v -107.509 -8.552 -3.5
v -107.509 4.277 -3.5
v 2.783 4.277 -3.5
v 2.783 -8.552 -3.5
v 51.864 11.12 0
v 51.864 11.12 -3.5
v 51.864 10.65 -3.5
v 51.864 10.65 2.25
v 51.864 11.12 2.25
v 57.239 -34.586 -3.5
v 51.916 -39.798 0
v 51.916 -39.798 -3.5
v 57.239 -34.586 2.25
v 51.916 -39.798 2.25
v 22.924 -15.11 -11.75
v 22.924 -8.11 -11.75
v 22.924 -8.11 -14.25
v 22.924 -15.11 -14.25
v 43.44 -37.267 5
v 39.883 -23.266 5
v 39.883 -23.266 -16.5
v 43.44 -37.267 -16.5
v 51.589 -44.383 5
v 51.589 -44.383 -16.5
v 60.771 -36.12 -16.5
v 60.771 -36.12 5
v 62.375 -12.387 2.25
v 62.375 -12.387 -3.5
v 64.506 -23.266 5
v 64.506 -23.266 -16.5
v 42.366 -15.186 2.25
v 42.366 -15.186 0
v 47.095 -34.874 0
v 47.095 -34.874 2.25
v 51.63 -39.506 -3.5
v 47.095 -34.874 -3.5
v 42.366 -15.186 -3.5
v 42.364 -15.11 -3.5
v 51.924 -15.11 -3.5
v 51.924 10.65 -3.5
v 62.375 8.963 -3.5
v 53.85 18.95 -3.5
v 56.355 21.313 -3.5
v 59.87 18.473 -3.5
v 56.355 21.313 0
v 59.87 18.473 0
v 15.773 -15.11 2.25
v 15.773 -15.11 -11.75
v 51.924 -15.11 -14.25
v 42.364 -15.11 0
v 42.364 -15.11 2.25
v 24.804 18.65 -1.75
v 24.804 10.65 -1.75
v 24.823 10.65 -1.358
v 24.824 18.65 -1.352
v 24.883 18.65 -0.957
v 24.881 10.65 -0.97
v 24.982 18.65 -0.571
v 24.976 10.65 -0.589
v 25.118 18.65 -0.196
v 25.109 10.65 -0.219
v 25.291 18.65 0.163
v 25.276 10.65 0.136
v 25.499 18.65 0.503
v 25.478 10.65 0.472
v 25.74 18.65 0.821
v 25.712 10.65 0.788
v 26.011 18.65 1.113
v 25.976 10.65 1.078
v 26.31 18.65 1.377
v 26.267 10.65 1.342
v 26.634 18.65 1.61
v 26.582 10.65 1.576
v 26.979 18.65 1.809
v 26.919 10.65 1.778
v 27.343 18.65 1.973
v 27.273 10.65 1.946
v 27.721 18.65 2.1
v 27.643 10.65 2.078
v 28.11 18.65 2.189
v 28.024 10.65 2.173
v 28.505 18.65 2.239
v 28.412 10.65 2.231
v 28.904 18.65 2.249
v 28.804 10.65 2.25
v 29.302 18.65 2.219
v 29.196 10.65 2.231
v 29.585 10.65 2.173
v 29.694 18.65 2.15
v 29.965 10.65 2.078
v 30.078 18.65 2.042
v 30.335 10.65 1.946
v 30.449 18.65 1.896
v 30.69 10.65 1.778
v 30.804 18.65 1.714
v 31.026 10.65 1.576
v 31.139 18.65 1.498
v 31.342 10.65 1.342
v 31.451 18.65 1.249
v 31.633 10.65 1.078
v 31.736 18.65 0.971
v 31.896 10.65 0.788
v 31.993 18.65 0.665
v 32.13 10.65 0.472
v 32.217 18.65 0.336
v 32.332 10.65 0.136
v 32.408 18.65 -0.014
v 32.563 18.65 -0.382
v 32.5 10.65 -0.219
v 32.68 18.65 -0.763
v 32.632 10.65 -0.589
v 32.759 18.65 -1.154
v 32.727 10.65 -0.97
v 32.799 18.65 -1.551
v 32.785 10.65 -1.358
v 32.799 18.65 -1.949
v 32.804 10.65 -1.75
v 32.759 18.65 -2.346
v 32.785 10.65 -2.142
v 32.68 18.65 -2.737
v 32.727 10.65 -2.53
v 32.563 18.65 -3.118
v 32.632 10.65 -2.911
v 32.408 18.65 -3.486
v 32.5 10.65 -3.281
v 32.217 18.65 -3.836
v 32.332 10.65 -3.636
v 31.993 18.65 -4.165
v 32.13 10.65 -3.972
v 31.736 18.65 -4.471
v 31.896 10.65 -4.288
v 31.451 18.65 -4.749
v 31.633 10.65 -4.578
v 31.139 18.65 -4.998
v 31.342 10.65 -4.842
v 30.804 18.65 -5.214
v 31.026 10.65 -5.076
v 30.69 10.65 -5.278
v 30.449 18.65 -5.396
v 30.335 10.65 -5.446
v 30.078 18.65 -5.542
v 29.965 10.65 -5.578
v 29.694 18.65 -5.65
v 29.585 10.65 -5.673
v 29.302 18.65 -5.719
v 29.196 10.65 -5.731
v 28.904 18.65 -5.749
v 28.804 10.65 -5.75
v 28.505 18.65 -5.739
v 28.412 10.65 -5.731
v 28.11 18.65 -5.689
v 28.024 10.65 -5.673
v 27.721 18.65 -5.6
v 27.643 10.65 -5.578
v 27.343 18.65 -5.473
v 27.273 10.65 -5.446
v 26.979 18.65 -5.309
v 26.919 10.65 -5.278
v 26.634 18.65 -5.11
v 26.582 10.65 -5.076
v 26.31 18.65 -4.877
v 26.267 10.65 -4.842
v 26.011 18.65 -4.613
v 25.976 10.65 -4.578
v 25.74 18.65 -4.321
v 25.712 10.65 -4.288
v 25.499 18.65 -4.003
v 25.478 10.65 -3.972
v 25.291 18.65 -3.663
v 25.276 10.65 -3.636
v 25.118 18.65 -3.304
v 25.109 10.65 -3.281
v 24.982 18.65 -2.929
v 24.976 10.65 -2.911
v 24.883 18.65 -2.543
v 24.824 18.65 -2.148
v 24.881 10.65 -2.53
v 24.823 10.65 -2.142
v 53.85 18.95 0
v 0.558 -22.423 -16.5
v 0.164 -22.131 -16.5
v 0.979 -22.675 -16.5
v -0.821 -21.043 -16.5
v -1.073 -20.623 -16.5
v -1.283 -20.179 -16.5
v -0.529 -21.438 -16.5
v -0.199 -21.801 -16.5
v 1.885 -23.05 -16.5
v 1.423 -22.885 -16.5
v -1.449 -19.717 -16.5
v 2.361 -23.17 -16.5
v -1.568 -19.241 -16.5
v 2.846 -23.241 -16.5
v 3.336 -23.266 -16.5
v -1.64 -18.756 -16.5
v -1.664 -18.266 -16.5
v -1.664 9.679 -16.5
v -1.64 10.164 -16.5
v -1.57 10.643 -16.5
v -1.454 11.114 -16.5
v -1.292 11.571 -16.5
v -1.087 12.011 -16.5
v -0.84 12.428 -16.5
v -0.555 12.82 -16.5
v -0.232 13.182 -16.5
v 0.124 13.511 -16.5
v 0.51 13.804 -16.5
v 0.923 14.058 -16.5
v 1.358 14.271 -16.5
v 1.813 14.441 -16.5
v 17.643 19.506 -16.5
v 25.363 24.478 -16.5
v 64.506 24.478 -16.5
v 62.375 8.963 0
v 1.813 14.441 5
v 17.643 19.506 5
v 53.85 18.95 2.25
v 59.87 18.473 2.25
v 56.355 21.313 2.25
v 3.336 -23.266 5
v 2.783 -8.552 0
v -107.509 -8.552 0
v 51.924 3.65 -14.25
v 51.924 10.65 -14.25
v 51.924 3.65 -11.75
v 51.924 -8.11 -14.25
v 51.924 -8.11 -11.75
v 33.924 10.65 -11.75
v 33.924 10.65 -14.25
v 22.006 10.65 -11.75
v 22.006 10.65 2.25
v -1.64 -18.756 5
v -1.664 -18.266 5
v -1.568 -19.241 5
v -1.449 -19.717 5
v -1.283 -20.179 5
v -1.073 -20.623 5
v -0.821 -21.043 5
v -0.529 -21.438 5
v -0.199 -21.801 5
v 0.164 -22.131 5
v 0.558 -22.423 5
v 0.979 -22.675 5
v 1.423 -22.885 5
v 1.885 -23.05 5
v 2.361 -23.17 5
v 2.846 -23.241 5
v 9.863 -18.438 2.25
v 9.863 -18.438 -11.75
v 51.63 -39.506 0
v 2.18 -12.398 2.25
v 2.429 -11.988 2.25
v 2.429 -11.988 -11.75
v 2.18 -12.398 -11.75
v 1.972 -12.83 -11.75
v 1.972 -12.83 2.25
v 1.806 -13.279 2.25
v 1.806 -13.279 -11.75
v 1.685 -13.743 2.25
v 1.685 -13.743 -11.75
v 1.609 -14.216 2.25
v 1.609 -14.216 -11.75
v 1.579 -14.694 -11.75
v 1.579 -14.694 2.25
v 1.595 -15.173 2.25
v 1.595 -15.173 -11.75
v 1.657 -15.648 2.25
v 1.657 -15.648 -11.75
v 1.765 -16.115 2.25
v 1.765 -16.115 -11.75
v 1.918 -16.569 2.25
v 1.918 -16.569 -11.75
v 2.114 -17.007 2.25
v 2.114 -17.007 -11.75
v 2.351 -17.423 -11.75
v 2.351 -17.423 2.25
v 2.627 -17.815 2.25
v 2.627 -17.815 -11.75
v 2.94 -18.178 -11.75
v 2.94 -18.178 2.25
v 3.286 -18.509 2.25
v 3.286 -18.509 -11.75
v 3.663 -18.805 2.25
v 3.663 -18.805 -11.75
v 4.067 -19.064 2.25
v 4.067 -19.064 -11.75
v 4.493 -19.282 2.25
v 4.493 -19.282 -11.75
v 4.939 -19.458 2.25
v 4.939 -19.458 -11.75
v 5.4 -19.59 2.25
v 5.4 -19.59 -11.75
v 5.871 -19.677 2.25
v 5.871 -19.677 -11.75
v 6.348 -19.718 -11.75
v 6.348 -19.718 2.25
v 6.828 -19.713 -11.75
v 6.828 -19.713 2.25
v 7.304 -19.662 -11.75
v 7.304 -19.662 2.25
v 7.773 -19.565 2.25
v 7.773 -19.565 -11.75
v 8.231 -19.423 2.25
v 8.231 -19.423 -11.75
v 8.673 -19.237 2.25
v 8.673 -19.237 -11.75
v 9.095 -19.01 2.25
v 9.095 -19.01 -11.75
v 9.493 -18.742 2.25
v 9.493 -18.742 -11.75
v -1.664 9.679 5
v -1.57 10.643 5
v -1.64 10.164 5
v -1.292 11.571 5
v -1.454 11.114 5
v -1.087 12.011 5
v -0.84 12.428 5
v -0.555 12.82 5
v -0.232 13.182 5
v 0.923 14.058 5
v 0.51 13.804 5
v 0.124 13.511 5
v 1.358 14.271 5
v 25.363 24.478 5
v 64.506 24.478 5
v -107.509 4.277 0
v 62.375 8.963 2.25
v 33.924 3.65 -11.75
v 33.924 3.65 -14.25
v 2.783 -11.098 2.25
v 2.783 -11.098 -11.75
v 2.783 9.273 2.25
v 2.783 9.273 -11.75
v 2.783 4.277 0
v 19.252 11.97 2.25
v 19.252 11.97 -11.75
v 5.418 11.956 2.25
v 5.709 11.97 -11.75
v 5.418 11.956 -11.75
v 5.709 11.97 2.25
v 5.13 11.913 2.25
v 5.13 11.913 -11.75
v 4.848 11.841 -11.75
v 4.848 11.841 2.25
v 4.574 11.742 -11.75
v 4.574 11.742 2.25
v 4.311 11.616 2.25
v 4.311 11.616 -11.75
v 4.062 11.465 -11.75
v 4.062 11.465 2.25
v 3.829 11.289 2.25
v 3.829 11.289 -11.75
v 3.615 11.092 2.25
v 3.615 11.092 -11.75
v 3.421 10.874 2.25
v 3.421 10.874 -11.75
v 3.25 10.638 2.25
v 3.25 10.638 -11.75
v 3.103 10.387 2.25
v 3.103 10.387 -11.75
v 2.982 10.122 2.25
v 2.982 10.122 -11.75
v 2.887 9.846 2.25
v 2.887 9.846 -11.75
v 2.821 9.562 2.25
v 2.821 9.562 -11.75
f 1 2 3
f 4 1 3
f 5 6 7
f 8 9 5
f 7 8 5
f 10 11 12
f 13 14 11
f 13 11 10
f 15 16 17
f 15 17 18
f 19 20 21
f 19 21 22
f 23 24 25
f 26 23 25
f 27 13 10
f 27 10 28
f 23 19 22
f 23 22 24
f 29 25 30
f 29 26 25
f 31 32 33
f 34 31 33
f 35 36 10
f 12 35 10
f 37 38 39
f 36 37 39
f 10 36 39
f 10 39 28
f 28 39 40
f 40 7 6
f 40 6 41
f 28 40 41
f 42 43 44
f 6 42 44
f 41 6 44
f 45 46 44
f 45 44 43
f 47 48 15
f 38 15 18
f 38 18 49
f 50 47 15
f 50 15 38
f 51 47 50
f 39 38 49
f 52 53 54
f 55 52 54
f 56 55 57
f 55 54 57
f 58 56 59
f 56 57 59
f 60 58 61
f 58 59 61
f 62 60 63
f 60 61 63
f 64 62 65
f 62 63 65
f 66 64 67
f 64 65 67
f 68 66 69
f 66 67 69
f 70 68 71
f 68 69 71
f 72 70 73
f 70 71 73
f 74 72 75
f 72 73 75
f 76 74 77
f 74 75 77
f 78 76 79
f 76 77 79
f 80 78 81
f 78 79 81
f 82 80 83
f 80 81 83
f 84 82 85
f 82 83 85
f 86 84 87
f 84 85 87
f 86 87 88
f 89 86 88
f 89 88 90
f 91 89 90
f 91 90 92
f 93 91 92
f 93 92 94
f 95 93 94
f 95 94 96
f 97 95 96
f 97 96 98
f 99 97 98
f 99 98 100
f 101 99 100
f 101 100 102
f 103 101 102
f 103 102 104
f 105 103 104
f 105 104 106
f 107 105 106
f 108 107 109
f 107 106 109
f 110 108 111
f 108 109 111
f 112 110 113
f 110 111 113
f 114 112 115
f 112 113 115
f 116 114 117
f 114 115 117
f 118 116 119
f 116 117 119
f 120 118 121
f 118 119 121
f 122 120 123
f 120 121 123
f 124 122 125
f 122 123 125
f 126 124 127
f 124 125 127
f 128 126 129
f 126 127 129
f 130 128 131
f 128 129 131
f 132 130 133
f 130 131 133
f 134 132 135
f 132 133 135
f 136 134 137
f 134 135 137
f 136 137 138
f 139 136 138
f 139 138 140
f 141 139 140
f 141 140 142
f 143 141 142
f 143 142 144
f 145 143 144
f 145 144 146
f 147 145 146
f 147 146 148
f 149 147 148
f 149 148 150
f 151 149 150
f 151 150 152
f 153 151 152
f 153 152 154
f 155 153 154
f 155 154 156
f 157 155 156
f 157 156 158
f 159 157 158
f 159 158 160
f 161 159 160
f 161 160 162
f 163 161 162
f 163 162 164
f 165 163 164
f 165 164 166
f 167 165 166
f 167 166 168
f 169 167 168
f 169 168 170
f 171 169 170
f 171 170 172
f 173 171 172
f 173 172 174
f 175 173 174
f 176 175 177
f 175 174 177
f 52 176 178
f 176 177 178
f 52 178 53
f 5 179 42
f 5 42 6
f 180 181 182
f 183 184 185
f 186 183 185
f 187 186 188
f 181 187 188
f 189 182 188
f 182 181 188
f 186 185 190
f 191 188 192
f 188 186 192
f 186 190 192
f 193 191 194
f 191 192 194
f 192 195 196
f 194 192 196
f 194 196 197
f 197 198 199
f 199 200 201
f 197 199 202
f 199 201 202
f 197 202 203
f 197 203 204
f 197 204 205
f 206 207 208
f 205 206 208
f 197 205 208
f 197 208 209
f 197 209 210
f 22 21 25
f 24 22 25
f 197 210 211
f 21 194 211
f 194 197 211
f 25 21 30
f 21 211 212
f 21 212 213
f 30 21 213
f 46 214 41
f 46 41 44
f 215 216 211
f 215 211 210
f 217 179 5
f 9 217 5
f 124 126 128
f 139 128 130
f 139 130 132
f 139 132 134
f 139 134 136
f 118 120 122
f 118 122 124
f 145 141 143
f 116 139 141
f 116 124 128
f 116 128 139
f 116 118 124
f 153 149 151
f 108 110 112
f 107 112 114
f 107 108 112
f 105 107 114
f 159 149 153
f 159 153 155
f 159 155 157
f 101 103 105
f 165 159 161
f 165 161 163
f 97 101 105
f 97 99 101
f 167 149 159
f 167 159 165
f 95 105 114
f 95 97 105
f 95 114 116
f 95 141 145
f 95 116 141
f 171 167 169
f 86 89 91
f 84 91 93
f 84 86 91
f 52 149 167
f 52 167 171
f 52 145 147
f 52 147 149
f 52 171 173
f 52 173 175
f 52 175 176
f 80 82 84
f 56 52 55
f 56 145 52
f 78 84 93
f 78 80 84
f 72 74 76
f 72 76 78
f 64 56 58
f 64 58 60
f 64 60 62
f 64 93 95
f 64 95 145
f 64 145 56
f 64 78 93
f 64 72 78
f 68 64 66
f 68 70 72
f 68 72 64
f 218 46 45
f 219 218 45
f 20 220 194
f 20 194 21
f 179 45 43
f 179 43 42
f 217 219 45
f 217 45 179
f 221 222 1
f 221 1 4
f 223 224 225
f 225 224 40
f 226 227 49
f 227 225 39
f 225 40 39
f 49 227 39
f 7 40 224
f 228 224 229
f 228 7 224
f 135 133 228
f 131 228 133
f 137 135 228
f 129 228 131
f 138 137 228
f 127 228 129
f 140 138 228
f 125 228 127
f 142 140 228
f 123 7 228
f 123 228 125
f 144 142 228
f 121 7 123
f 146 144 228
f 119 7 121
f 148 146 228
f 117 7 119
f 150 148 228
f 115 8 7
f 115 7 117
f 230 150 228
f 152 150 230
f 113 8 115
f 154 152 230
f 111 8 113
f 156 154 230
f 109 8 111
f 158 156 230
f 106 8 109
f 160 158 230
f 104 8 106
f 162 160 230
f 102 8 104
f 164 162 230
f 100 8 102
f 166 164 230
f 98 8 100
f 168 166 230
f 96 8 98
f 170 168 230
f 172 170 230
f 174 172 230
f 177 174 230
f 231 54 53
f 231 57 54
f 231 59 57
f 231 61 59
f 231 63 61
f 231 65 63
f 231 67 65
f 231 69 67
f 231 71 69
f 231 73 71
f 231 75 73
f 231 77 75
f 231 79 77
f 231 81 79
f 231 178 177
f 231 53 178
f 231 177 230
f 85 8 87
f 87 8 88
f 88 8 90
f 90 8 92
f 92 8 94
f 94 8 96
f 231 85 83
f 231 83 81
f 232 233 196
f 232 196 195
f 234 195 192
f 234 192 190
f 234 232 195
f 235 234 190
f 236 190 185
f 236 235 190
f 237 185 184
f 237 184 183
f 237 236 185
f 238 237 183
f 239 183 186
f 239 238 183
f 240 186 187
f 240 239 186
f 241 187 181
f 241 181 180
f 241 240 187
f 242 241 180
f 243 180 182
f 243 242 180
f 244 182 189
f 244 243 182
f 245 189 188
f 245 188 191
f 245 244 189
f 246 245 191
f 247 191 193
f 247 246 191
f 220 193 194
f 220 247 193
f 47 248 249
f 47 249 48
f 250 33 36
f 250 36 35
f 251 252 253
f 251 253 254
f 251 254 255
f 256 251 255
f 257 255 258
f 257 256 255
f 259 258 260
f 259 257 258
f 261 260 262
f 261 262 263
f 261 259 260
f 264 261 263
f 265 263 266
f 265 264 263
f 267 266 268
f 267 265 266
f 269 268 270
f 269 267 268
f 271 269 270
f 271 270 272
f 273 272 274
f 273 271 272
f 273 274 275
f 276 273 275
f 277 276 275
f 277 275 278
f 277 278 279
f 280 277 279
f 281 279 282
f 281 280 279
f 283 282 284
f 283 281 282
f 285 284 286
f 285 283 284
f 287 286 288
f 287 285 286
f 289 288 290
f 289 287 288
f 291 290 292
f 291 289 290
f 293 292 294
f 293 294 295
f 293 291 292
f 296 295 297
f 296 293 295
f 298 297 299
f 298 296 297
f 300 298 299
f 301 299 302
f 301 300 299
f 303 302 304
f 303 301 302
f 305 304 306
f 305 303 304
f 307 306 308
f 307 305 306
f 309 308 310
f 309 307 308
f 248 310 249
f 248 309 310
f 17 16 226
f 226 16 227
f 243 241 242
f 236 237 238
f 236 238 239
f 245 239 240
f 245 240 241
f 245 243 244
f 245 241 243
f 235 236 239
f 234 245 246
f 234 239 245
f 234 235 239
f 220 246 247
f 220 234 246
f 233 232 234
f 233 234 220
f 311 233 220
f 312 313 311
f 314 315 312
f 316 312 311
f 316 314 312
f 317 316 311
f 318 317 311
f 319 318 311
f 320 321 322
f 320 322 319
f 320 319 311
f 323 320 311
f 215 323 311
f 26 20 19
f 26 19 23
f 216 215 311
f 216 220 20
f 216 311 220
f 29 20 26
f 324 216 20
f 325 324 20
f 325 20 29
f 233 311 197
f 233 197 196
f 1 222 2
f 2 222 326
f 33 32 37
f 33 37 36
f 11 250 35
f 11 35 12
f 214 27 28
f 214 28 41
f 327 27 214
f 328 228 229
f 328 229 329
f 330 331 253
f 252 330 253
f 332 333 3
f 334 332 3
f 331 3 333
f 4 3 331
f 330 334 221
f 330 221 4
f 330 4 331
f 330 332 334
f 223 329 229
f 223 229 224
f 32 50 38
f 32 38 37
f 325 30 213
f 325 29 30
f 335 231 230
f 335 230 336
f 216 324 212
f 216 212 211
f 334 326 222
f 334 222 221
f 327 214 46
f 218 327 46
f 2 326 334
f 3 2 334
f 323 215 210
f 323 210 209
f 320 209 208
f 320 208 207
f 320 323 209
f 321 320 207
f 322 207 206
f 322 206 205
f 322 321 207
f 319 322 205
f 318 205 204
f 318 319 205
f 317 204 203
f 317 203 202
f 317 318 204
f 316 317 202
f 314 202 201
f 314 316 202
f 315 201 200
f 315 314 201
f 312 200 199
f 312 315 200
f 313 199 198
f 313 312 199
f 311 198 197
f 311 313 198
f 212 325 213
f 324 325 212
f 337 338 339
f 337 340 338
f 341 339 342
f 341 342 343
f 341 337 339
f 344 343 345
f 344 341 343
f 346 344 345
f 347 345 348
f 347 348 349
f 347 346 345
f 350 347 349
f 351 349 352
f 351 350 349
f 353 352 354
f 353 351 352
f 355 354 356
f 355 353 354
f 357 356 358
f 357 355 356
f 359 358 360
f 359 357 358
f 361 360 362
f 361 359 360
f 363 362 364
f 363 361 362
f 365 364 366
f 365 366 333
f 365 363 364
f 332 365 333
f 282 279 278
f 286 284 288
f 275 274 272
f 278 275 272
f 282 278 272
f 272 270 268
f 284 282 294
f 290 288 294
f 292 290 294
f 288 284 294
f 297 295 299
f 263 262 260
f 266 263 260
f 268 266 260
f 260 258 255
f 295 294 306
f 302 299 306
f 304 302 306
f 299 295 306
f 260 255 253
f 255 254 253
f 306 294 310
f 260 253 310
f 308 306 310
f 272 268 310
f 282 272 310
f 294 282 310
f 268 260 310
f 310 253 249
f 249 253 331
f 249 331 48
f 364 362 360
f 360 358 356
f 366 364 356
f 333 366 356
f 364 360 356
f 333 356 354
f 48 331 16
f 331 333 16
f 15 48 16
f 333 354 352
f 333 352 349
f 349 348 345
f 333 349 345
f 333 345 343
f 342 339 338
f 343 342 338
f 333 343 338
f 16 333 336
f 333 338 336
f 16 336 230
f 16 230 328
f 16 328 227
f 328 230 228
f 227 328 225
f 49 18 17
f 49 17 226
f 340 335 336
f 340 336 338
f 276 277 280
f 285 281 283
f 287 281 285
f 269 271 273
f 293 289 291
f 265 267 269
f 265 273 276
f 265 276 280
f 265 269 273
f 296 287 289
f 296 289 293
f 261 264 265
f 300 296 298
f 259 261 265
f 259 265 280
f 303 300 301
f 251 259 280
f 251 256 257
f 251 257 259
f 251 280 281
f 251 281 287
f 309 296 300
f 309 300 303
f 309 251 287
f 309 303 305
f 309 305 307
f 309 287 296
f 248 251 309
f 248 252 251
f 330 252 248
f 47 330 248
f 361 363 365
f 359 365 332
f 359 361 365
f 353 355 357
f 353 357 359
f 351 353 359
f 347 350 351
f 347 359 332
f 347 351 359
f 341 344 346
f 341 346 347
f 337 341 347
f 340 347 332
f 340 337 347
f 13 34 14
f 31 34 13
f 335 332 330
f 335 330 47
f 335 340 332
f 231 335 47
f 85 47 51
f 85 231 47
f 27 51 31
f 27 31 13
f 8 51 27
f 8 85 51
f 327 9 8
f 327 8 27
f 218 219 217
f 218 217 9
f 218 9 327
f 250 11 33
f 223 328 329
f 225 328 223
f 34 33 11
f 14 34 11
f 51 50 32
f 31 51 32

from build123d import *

# Parameters (mm, degrees)
F1_W           = 112.909309
F1_H           = 12.828815
F2_DEPTH       = 3.5
F4_DEPTH       = 2.25
F5_DEPTH       = 11.75
F6_R           = 4
F7_DEPTH       = 8
F8_W           = 29
F8_H           = 7
F8_W_2         = 18
F9_DEPTH       = 2.5
F11_DEPTH      = 5
F11_DEPTH_BACK = 16.5


with BuildPart() as f2:
    # F1 (on Top) → F2 (new body)
    with BuildSketch(Plane.XY):
        with Locations((-51.054764, -2.137298)):
            Rectangle(F1_W, F1_H)
        Polygon((42.313779, -13.007842), (42.365629, -15.185677), (47.094572, -34.873515), (51.630174, -39.505617), (51.916405, -39.797939), (57.239019, -34.586211), (62.374923, -12.387008), (62.374923, 8.963183), (59.870068, 18.472588), (56.35526, 21.313125), (53.849608, 18.950125), (51.864199, 11.120169), (51.864199, -4.743773), (49.167123, -4.743773), (49.167123, -12.950492), align=None)
    extrude(amount=-F2_DEPTH)

    # F3 (on Top) + F2_face (on face) → F4 (join)
    with BuildSketch(Plane.XY):
        with BuildLine():
            Line((2.782656, 9.273215), (2.782656, -11.098319))
            Line((2.782656, -11.098319), (2.429253, -11.988475))
            ThreePointArc((2.429253, -11.988475), (3.286365, -18.509252), (9.862848, -18.438196))
            Line((9.862848, -18.438196), (15.773462, -15.109889))
            Line((15.773462, -15.109889), (51.924363, -15.109889))
            Line((51.924363, -15.109889), (51.924363, -4.760419))
            Line((51.924363, -4.760419), (51.924363, 10.650446))
            Line((51.924363, 10.650446), (22.006499, 10.650446))
            Line((22.006499, 10.650446), (19.252038, 11.970293))
            Line((19.252038, 11.970293), (5.70927, 11.970293))
            ThreePointArc((5.70927, 11.970293), (3.71934, 11.193196), (2.782656, 9.273215))
        make_face()
    with BuildSketch(Plane(origin=(54.305877, -11.206478, 0), x_dir=(1, 0, 0), z_dir=(0, 0, 1))):
        Polygon((8.069046, 20.16966), (5.564191, 29.679065), (2.049383, 32.519603), (-0.456269, 30.156603), (-2.441678, 22.326646), (-2.441678, 6.462704), (-5.138754, 6.462704), (-5.138754, -1.744015), (-11.992098, -1.801365), (-11.940248, -3.979199), (-7.211305, -23.667038), (-2.389472, -28.591461), (2.933142, -23.379733), (8.069046, -1.18053), align=None)
    extrude(amount=F4_DEPTH)

    # F3 (on Top) → F5 (join)
    with BuildSketch(Plane.XY):
        with BuildLine():
            Line((2.782656, 9.273215), (2.782656, -11.098319))
            Line((2.782656, -11.098319), (2.429253, -11.988475))
            ThreePointArc((2.429253, -11.988475), (3.286365, -18.509252), (9.862848, -18.438196))
            Line((9.862848, -18.438196), (15.773462, -15.109889))
            Line((15.773462, -15.109889), (51.924363, -15.109889))
            Line((51.924363, -15.109889), (51.924363, -4.760419))
            Line((51.924363, -4.760419), (51.924363, 10.650446))
            Line((51.924363, 10.650446), (22.006499, 10.650446))
            Line((22.006499, 10.650446), (19.252038, 11.970293))
            Line((19.252038, 11.970293), (5.70927, 11.970293))
            ThreePointArc((5.70927, 11.970293), (3.71934, 11.193196), (2.782656, 9.273215))
        make_face()
    extrude(amount=-F5_DEPTH)

    # F6 (on face) → F7 (join)
    with BuildSketch(Plane(origin=(0, 10.650446, 0), x_dir=(-1, 0, 0), z_dir=(0, 1, 0))):
        with Locations((-28.804159, -1.75)):
            Circle(F6_R)
    extrude(amount=F7_DEPTH)

    # F8 (on face) → F9 (join)
    with BuildSketch(Plane(origin=(0, 0, -11.75), x_dir=(1, 0, 0), z_dir=(0, 0, -1))):
        with Locations((37.424363, 11.609889)):
            Rectangle(F8_W, F8_H)
        with Locations((42.924363, -7.150446)):
            Rectangle(F8_W_2, F8_H)
    extrude(amount=F9_DEPTH)


with BuildPart() as f11:
    # F10 (on Top) → F11 (new body, two sides)
    with BuildSketch(Plane.XY) as f11_sk:
        with BuildLine():
            Line((64.505808, -23.265576), (64.505808, 24.478413))
            Line((64.505808, 24.478413), (25.363356, 24.478413))
            Line((25.363356, 24.478413), (17.642634, 19.50583))
            Line((17.642634, 19.50583), (1.812583, 14.441451))
            ThreePointArc((1.812583, 14.441451), (-0.702298, 12.627298), (-1.663876, 9.679223))
            Line((-1.663876, 9.679223), (-1.663876, -18.265576))
            ThreePointArc((-1.663876, -18.265576), (-0.19941, -21.80111), (3.336124, -23.265576))
            Line((3.336124, -23.265576), (39.882578, -23.265576))
            Line((39.882578, -23.265576), (43.44042, -37.26742))
            Line((43.44042, -37.26742), (51.589034, -44.383109))
            Line((51.589034, -44.383109), (60.770571, -36.119729))
            Line((60.770571, -36.119729), (64.505808, -23.265576))
        make_face()
    extrude(amount=F11_DEPTH)
    extrude(f11_sk.sketch, amount=-F11_DEPTH_BACK)


solid = Compound([f2.part, f11.part])
